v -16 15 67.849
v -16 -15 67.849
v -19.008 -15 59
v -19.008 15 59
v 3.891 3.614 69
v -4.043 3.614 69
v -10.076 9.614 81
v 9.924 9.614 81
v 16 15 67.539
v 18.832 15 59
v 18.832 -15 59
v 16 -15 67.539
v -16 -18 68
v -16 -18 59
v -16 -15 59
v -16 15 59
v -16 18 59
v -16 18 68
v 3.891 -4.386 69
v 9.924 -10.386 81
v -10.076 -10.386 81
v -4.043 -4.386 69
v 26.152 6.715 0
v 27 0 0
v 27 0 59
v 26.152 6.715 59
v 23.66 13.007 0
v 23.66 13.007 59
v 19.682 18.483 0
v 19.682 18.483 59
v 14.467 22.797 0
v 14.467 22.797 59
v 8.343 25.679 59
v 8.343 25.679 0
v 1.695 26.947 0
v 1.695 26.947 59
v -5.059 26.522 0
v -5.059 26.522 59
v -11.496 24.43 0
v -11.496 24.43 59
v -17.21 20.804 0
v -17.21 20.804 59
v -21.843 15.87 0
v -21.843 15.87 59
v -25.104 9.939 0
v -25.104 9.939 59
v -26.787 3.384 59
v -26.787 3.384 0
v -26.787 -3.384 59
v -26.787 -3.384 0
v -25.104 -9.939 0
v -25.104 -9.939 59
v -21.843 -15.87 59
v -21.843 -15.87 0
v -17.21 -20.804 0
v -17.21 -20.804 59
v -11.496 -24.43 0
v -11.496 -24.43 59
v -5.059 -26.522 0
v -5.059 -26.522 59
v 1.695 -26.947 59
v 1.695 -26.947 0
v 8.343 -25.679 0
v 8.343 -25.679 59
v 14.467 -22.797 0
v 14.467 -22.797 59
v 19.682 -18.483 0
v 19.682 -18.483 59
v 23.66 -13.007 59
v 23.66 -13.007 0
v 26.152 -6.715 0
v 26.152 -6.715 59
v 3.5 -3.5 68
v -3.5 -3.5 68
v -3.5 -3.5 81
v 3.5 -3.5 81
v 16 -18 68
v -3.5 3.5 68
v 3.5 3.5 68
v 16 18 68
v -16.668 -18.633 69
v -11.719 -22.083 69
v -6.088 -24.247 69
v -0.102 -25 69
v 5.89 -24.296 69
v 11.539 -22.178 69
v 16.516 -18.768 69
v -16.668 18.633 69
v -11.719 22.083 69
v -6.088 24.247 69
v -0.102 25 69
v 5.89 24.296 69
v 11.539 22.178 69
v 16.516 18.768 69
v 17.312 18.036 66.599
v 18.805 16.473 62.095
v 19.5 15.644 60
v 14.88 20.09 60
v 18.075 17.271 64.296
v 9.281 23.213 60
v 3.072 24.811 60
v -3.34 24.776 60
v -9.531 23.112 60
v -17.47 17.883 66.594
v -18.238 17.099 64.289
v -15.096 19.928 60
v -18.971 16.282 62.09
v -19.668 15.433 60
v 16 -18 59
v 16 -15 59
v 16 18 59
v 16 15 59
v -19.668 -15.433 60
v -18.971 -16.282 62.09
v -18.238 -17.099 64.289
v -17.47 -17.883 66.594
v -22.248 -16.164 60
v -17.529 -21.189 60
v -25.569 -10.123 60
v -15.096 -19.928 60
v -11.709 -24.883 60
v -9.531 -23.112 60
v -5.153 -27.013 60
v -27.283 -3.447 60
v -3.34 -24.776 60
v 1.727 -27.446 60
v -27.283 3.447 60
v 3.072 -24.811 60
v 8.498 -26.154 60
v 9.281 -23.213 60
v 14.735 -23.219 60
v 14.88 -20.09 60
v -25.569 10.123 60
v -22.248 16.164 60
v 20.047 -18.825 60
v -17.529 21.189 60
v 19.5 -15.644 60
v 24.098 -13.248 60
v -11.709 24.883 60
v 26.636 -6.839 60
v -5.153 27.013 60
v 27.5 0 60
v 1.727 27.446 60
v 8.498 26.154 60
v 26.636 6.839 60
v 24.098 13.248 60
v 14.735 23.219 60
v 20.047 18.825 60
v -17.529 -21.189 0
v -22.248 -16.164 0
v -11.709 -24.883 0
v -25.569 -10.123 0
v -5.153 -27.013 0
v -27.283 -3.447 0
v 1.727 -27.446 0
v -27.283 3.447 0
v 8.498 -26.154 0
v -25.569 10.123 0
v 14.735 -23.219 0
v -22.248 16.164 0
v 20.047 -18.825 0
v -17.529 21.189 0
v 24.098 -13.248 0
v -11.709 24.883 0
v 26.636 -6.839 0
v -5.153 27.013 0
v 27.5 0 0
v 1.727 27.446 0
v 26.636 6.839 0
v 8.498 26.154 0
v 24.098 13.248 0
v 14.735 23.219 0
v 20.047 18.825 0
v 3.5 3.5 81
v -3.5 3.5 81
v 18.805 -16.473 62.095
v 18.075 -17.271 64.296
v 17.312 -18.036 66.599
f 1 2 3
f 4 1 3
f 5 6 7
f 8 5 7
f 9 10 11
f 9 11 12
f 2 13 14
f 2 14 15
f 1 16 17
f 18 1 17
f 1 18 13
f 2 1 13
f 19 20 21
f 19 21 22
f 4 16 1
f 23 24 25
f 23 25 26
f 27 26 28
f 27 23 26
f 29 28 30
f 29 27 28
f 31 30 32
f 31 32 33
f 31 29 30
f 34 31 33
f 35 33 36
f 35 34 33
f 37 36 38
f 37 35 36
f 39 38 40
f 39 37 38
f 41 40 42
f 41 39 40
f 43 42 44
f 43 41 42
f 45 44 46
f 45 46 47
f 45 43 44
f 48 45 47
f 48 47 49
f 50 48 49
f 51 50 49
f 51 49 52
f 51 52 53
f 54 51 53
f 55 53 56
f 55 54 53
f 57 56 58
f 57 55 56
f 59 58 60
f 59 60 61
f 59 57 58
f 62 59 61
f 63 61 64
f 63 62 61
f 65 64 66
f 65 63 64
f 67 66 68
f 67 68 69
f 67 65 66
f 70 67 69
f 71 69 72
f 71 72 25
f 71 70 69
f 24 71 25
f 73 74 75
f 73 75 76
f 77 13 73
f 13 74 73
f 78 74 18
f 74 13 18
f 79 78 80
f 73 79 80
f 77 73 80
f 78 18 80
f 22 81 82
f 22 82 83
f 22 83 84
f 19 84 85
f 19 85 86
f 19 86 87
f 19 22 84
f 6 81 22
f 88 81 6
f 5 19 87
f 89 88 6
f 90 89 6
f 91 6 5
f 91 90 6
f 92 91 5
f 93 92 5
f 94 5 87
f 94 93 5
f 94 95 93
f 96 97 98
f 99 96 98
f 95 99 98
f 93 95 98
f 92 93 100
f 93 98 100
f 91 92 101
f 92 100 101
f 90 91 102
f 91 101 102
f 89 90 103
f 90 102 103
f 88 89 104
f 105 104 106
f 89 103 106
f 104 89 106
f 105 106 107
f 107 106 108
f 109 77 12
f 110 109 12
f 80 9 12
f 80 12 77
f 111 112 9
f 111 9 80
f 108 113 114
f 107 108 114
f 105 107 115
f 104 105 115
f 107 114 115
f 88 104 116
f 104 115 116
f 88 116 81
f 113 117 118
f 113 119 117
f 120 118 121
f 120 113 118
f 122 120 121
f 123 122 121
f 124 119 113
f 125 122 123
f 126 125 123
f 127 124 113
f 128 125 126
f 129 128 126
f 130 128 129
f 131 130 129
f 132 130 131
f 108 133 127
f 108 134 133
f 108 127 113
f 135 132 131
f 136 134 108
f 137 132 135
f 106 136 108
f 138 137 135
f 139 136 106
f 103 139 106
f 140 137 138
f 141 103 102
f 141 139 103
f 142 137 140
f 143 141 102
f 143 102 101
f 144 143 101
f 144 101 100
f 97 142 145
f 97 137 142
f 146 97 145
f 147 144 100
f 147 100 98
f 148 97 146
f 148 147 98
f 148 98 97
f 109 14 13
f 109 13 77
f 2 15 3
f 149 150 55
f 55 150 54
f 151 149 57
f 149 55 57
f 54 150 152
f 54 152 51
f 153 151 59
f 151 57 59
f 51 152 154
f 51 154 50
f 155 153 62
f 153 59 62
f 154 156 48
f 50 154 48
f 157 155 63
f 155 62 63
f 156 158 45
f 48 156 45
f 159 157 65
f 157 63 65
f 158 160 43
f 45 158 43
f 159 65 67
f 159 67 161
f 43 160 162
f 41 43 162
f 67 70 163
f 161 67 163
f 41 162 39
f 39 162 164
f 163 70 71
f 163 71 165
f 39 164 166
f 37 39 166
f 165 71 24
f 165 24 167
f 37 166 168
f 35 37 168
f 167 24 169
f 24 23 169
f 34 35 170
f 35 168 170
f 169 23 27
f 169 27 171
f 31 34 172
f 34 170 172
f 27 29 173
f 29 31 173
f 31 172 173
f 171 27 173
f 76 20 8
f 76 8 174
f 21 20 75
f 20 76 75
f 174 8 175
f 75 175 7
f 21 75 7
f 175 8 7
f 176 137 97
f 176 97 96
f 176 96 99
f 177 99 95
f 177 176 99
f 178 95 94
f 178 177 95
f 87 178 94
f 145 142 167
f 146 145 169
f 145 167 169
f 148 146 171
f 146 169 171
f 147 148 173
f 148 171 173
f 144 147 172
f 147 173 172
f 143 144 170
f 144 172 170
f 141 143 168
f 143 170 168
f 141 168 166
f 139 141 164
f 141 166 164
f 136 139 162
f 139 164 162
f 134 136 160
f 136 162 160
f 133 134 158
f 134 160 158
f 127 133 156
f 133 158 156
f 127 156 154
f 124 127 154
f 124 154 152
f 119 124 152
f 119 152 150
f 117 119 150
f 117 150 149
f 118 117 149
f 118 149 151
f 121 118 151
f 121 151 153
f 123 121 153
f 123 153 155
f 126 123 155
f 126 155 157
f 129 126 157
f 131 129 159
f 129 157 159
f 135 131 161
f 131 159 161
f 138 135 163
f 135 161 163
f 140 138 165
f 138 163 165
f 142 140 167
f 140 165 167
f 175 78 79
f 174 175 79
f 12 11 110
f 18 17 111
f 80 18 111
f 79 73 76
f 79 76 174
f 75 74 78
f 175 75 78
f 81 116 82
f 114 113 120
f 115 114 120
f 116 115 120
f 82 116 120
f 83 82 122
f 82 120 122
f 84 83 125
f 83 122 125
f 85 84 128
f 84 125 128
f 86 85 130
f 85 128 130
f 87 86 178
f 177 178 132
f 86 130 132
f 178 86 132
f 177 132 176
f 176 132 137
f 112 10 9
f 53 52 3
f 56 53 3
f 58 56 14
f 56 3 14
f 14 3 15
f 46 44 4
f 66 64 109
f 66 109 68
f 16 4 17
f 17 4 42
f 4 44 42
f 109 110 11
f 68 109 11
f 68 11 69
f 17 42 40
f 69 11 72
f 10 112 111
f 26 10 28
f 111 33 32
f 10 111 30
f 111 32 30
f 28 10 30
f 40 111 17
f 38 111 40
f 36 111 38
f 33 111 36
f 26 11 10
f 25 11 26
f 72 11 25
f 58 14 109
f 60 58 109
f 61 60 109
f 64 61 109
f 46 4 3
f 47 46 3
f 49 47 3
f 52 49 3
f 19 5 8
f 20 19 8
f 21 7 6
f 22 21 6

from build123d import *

# Parameters (mm, degrees)
ESBO_O2_R                      = 27.5
RESSALTO_EXTRUS_O1_DEPTH       = 60
CORTE_EXTRUS_O3_DEPTH          = 59
CORTE_EXTRUS_O3_DEPTH_BACK     = 2
ESBO_O3_R                      = 27
ESBO_O4_R                      = 25
RESSALTO_EXTRUS_O10_DEPTH      = 69
CORTE_EXTRUS_O4_DEPTH          = 43
CORTE_EXTRUS_O4_DEPTH_BACK     = 48
RESSALTO_EXTRUS_O11_DEPTH      = 20
RESSALTO_EXTRUS_O11_DEPTH_BACK = 20
CORTE_EXTRUS_O5_DEPTH          = 30
CORTE_EXTRUS_O5_DEPTH_BACK     = 24
ESBO_O10_R                     = 25.877915993
CORTE_EXTRUS_O6_DEPTH          = 59
CORTE_EXTRUS_O7_DEPTH          = 68
CORTE_EXTRUS_O7_DEPTH_BACK     = 1
ESBO_O11_W                     = 32
ESBO_O11_H                     = 36
CORTE_EXTRUS_O10_DEPTH         = 15
CORTE_EXTRUS_O10_DEPTH_BACK    = 15
ESBO_O13_W                     = 7
ESBO_O13_H                     = 7
CORTE_EXTRUS_O11_DEPTH         = 83


with BuildPart() as part:
    # Esboço2 → Ressalto-extrusão1 (new body)
    with BuildSketch(Plane.XY):
        Circle(ESBO_O2_R)
    extrude(amount=RESSALTO_EXTRUS_O1_DEPTH)

    # Esboço3 → Corte-extrusão3 (cut, two sides: drawn at the far end of the back side and taken through both)
    with BuildSketch(Plane.XY.offset(-CORTE_EXTRUS_O3_DEPTH_BACK)):
        Circle(ESBO_O3_R)
    extrude(amount=CORTE_EXTRUS_O3_DEPTH + CORTE_EXTRUS_O3_DEPTH_BACK, mode=Mode.SUBTRACT)

    # Esboço4 → Ressalto-extrusão10 (add)
    with BuildSketch(Plane.XY):
        Circle(ESBO_O4_R)
    extrude(amount=RESSALTO_EXTRUS_O10_DEPTH)

    # Esboço6 → Corte-extrusão4 (cut, two sides: drawn at the far end of the back side and taken through both)
    with BuildSketch(Plane(origin=(0, 0, 0), x_dir=(1, 0, 0), z_dir=(0, 1, 0)).offset(-CORTE_EXTRUS_O4_DEPTH_BACK)):
        Polygon((-27.667910376, -60), (-19.667910376, -60), (-16.667910376, -69), (-27.667910376, -69), align=None)
        Polygon((27.5, -60), (19.5, -60), (16.515708897, -69), (27.5, -69), align=None)
    extrude(amount=CORTE_EXTRUS_O4_DEPTH + CORTE_EXTRUS_O4_DEPTH_BACK, mode=Mode.SUBTRACT)

    # Esboço7 → Ressalto-extrusão11 (add, two sides: drawn at the far end of the back side and taken through both)
    with BuildSketch(Plane(origin=(0, 0, 0), x_dir=(1, 0, 0), z_dir=(0, 1, 0)).offset(-RESSALTO_EXTRUS_O11_DEPTH_BACK)):
        Polygon((-4.043441925, -69), (3.891240446, -69), (9.923899261, -81), (-10.076100739, -81), align=None)
    extrude(amount=RESSALTO_EXTRUS_O11_DEPTH + RESSALTO_EXTRUS_O11_DEPTH_BACK)

    # Esboço9 → Corte-extrusão5 (cut, two sides: drawn at the far end of the back side and taken through both)
    with BuildSketch(Plane(origin=(0, 0, 0), x_dir=(0, 0, -1), z_dir=(1, 0, 0)).offset(-CORTE_EXTRUS_O5_DEPTH_BACK)):
        Polygon((-81, -10.386236586), (-69, -4.386236586), (-69, -22.806779524), (-81, -22.806779524), align=None)
        Polygon((-69, 3.613763414), (-81, 9.613763414), (-81, 21.387044081), (-69, 21.387044081), align=None)
    extrude(amount=CORTE_EXTRUS_O5_DEPTH + CORTE_EXTRUS_O5_DEPTH_BACK, mode=Mode.SUBTRACT)

    # Esboço10 → Corte-extrusão6 (cut)
    with BuildSketch(Plane.XY):
        Circle(ESBO_O10_R)
    extrude(amount=CORTE_EXTRUS_O6_DEPTH, mode=Mode.SUBTRACT)

    # Esboço11 → Corte-extrusão7 (cut, two sides: drawn at the far end of the back side and taken through both)
    with BuildSketch(Plane.XY.offset(-CORTE_EXTRUS_O7_DEPTH_BACK)):
        Rectangle(ESBO_O11_W, ESBO_O11_H)
    extrude(amount=CORTE_EXTRUS_O7_DEPTH + CORTE_EXTRUS_O7_DEPTH_BACK, mode=Mode.SUBTRACT)

    # Esboço12 → Corte-extrusão10 (cut, two sides: drawn at the far end of the back side and taken through both)
    with BuildSketch(Plane(origin=(0, 0, 0), x_dir=(1, 0, 0), z_dir=(0, 1, 0)).offset(-CORTE_EXTRUS_O10_DEPTH_BACK)):
        Polygon((-19.069725689, -58.817820976), (18.89199626, -58.817820976), (15.847296797, -68), (-15.94876003, -68), align=None)
    extrude(amount=CORTE_EXTRUS_O10_DEPTH + CORTE_EXTRUS_O10_DEPTH_BACK, mode=Mode.SUBTRACT)

    # Esboço13 → Corte-extrusão11 (cut)
    with BuildSketch(Plane.XY):
        Rectangle(ESBO_O13_W, ESBO_O13_H)
    extrude(amount=CORTE_EXTRUS_O11_DEPTH, mode=Mode.SUBTRACT)


solid = part.part
